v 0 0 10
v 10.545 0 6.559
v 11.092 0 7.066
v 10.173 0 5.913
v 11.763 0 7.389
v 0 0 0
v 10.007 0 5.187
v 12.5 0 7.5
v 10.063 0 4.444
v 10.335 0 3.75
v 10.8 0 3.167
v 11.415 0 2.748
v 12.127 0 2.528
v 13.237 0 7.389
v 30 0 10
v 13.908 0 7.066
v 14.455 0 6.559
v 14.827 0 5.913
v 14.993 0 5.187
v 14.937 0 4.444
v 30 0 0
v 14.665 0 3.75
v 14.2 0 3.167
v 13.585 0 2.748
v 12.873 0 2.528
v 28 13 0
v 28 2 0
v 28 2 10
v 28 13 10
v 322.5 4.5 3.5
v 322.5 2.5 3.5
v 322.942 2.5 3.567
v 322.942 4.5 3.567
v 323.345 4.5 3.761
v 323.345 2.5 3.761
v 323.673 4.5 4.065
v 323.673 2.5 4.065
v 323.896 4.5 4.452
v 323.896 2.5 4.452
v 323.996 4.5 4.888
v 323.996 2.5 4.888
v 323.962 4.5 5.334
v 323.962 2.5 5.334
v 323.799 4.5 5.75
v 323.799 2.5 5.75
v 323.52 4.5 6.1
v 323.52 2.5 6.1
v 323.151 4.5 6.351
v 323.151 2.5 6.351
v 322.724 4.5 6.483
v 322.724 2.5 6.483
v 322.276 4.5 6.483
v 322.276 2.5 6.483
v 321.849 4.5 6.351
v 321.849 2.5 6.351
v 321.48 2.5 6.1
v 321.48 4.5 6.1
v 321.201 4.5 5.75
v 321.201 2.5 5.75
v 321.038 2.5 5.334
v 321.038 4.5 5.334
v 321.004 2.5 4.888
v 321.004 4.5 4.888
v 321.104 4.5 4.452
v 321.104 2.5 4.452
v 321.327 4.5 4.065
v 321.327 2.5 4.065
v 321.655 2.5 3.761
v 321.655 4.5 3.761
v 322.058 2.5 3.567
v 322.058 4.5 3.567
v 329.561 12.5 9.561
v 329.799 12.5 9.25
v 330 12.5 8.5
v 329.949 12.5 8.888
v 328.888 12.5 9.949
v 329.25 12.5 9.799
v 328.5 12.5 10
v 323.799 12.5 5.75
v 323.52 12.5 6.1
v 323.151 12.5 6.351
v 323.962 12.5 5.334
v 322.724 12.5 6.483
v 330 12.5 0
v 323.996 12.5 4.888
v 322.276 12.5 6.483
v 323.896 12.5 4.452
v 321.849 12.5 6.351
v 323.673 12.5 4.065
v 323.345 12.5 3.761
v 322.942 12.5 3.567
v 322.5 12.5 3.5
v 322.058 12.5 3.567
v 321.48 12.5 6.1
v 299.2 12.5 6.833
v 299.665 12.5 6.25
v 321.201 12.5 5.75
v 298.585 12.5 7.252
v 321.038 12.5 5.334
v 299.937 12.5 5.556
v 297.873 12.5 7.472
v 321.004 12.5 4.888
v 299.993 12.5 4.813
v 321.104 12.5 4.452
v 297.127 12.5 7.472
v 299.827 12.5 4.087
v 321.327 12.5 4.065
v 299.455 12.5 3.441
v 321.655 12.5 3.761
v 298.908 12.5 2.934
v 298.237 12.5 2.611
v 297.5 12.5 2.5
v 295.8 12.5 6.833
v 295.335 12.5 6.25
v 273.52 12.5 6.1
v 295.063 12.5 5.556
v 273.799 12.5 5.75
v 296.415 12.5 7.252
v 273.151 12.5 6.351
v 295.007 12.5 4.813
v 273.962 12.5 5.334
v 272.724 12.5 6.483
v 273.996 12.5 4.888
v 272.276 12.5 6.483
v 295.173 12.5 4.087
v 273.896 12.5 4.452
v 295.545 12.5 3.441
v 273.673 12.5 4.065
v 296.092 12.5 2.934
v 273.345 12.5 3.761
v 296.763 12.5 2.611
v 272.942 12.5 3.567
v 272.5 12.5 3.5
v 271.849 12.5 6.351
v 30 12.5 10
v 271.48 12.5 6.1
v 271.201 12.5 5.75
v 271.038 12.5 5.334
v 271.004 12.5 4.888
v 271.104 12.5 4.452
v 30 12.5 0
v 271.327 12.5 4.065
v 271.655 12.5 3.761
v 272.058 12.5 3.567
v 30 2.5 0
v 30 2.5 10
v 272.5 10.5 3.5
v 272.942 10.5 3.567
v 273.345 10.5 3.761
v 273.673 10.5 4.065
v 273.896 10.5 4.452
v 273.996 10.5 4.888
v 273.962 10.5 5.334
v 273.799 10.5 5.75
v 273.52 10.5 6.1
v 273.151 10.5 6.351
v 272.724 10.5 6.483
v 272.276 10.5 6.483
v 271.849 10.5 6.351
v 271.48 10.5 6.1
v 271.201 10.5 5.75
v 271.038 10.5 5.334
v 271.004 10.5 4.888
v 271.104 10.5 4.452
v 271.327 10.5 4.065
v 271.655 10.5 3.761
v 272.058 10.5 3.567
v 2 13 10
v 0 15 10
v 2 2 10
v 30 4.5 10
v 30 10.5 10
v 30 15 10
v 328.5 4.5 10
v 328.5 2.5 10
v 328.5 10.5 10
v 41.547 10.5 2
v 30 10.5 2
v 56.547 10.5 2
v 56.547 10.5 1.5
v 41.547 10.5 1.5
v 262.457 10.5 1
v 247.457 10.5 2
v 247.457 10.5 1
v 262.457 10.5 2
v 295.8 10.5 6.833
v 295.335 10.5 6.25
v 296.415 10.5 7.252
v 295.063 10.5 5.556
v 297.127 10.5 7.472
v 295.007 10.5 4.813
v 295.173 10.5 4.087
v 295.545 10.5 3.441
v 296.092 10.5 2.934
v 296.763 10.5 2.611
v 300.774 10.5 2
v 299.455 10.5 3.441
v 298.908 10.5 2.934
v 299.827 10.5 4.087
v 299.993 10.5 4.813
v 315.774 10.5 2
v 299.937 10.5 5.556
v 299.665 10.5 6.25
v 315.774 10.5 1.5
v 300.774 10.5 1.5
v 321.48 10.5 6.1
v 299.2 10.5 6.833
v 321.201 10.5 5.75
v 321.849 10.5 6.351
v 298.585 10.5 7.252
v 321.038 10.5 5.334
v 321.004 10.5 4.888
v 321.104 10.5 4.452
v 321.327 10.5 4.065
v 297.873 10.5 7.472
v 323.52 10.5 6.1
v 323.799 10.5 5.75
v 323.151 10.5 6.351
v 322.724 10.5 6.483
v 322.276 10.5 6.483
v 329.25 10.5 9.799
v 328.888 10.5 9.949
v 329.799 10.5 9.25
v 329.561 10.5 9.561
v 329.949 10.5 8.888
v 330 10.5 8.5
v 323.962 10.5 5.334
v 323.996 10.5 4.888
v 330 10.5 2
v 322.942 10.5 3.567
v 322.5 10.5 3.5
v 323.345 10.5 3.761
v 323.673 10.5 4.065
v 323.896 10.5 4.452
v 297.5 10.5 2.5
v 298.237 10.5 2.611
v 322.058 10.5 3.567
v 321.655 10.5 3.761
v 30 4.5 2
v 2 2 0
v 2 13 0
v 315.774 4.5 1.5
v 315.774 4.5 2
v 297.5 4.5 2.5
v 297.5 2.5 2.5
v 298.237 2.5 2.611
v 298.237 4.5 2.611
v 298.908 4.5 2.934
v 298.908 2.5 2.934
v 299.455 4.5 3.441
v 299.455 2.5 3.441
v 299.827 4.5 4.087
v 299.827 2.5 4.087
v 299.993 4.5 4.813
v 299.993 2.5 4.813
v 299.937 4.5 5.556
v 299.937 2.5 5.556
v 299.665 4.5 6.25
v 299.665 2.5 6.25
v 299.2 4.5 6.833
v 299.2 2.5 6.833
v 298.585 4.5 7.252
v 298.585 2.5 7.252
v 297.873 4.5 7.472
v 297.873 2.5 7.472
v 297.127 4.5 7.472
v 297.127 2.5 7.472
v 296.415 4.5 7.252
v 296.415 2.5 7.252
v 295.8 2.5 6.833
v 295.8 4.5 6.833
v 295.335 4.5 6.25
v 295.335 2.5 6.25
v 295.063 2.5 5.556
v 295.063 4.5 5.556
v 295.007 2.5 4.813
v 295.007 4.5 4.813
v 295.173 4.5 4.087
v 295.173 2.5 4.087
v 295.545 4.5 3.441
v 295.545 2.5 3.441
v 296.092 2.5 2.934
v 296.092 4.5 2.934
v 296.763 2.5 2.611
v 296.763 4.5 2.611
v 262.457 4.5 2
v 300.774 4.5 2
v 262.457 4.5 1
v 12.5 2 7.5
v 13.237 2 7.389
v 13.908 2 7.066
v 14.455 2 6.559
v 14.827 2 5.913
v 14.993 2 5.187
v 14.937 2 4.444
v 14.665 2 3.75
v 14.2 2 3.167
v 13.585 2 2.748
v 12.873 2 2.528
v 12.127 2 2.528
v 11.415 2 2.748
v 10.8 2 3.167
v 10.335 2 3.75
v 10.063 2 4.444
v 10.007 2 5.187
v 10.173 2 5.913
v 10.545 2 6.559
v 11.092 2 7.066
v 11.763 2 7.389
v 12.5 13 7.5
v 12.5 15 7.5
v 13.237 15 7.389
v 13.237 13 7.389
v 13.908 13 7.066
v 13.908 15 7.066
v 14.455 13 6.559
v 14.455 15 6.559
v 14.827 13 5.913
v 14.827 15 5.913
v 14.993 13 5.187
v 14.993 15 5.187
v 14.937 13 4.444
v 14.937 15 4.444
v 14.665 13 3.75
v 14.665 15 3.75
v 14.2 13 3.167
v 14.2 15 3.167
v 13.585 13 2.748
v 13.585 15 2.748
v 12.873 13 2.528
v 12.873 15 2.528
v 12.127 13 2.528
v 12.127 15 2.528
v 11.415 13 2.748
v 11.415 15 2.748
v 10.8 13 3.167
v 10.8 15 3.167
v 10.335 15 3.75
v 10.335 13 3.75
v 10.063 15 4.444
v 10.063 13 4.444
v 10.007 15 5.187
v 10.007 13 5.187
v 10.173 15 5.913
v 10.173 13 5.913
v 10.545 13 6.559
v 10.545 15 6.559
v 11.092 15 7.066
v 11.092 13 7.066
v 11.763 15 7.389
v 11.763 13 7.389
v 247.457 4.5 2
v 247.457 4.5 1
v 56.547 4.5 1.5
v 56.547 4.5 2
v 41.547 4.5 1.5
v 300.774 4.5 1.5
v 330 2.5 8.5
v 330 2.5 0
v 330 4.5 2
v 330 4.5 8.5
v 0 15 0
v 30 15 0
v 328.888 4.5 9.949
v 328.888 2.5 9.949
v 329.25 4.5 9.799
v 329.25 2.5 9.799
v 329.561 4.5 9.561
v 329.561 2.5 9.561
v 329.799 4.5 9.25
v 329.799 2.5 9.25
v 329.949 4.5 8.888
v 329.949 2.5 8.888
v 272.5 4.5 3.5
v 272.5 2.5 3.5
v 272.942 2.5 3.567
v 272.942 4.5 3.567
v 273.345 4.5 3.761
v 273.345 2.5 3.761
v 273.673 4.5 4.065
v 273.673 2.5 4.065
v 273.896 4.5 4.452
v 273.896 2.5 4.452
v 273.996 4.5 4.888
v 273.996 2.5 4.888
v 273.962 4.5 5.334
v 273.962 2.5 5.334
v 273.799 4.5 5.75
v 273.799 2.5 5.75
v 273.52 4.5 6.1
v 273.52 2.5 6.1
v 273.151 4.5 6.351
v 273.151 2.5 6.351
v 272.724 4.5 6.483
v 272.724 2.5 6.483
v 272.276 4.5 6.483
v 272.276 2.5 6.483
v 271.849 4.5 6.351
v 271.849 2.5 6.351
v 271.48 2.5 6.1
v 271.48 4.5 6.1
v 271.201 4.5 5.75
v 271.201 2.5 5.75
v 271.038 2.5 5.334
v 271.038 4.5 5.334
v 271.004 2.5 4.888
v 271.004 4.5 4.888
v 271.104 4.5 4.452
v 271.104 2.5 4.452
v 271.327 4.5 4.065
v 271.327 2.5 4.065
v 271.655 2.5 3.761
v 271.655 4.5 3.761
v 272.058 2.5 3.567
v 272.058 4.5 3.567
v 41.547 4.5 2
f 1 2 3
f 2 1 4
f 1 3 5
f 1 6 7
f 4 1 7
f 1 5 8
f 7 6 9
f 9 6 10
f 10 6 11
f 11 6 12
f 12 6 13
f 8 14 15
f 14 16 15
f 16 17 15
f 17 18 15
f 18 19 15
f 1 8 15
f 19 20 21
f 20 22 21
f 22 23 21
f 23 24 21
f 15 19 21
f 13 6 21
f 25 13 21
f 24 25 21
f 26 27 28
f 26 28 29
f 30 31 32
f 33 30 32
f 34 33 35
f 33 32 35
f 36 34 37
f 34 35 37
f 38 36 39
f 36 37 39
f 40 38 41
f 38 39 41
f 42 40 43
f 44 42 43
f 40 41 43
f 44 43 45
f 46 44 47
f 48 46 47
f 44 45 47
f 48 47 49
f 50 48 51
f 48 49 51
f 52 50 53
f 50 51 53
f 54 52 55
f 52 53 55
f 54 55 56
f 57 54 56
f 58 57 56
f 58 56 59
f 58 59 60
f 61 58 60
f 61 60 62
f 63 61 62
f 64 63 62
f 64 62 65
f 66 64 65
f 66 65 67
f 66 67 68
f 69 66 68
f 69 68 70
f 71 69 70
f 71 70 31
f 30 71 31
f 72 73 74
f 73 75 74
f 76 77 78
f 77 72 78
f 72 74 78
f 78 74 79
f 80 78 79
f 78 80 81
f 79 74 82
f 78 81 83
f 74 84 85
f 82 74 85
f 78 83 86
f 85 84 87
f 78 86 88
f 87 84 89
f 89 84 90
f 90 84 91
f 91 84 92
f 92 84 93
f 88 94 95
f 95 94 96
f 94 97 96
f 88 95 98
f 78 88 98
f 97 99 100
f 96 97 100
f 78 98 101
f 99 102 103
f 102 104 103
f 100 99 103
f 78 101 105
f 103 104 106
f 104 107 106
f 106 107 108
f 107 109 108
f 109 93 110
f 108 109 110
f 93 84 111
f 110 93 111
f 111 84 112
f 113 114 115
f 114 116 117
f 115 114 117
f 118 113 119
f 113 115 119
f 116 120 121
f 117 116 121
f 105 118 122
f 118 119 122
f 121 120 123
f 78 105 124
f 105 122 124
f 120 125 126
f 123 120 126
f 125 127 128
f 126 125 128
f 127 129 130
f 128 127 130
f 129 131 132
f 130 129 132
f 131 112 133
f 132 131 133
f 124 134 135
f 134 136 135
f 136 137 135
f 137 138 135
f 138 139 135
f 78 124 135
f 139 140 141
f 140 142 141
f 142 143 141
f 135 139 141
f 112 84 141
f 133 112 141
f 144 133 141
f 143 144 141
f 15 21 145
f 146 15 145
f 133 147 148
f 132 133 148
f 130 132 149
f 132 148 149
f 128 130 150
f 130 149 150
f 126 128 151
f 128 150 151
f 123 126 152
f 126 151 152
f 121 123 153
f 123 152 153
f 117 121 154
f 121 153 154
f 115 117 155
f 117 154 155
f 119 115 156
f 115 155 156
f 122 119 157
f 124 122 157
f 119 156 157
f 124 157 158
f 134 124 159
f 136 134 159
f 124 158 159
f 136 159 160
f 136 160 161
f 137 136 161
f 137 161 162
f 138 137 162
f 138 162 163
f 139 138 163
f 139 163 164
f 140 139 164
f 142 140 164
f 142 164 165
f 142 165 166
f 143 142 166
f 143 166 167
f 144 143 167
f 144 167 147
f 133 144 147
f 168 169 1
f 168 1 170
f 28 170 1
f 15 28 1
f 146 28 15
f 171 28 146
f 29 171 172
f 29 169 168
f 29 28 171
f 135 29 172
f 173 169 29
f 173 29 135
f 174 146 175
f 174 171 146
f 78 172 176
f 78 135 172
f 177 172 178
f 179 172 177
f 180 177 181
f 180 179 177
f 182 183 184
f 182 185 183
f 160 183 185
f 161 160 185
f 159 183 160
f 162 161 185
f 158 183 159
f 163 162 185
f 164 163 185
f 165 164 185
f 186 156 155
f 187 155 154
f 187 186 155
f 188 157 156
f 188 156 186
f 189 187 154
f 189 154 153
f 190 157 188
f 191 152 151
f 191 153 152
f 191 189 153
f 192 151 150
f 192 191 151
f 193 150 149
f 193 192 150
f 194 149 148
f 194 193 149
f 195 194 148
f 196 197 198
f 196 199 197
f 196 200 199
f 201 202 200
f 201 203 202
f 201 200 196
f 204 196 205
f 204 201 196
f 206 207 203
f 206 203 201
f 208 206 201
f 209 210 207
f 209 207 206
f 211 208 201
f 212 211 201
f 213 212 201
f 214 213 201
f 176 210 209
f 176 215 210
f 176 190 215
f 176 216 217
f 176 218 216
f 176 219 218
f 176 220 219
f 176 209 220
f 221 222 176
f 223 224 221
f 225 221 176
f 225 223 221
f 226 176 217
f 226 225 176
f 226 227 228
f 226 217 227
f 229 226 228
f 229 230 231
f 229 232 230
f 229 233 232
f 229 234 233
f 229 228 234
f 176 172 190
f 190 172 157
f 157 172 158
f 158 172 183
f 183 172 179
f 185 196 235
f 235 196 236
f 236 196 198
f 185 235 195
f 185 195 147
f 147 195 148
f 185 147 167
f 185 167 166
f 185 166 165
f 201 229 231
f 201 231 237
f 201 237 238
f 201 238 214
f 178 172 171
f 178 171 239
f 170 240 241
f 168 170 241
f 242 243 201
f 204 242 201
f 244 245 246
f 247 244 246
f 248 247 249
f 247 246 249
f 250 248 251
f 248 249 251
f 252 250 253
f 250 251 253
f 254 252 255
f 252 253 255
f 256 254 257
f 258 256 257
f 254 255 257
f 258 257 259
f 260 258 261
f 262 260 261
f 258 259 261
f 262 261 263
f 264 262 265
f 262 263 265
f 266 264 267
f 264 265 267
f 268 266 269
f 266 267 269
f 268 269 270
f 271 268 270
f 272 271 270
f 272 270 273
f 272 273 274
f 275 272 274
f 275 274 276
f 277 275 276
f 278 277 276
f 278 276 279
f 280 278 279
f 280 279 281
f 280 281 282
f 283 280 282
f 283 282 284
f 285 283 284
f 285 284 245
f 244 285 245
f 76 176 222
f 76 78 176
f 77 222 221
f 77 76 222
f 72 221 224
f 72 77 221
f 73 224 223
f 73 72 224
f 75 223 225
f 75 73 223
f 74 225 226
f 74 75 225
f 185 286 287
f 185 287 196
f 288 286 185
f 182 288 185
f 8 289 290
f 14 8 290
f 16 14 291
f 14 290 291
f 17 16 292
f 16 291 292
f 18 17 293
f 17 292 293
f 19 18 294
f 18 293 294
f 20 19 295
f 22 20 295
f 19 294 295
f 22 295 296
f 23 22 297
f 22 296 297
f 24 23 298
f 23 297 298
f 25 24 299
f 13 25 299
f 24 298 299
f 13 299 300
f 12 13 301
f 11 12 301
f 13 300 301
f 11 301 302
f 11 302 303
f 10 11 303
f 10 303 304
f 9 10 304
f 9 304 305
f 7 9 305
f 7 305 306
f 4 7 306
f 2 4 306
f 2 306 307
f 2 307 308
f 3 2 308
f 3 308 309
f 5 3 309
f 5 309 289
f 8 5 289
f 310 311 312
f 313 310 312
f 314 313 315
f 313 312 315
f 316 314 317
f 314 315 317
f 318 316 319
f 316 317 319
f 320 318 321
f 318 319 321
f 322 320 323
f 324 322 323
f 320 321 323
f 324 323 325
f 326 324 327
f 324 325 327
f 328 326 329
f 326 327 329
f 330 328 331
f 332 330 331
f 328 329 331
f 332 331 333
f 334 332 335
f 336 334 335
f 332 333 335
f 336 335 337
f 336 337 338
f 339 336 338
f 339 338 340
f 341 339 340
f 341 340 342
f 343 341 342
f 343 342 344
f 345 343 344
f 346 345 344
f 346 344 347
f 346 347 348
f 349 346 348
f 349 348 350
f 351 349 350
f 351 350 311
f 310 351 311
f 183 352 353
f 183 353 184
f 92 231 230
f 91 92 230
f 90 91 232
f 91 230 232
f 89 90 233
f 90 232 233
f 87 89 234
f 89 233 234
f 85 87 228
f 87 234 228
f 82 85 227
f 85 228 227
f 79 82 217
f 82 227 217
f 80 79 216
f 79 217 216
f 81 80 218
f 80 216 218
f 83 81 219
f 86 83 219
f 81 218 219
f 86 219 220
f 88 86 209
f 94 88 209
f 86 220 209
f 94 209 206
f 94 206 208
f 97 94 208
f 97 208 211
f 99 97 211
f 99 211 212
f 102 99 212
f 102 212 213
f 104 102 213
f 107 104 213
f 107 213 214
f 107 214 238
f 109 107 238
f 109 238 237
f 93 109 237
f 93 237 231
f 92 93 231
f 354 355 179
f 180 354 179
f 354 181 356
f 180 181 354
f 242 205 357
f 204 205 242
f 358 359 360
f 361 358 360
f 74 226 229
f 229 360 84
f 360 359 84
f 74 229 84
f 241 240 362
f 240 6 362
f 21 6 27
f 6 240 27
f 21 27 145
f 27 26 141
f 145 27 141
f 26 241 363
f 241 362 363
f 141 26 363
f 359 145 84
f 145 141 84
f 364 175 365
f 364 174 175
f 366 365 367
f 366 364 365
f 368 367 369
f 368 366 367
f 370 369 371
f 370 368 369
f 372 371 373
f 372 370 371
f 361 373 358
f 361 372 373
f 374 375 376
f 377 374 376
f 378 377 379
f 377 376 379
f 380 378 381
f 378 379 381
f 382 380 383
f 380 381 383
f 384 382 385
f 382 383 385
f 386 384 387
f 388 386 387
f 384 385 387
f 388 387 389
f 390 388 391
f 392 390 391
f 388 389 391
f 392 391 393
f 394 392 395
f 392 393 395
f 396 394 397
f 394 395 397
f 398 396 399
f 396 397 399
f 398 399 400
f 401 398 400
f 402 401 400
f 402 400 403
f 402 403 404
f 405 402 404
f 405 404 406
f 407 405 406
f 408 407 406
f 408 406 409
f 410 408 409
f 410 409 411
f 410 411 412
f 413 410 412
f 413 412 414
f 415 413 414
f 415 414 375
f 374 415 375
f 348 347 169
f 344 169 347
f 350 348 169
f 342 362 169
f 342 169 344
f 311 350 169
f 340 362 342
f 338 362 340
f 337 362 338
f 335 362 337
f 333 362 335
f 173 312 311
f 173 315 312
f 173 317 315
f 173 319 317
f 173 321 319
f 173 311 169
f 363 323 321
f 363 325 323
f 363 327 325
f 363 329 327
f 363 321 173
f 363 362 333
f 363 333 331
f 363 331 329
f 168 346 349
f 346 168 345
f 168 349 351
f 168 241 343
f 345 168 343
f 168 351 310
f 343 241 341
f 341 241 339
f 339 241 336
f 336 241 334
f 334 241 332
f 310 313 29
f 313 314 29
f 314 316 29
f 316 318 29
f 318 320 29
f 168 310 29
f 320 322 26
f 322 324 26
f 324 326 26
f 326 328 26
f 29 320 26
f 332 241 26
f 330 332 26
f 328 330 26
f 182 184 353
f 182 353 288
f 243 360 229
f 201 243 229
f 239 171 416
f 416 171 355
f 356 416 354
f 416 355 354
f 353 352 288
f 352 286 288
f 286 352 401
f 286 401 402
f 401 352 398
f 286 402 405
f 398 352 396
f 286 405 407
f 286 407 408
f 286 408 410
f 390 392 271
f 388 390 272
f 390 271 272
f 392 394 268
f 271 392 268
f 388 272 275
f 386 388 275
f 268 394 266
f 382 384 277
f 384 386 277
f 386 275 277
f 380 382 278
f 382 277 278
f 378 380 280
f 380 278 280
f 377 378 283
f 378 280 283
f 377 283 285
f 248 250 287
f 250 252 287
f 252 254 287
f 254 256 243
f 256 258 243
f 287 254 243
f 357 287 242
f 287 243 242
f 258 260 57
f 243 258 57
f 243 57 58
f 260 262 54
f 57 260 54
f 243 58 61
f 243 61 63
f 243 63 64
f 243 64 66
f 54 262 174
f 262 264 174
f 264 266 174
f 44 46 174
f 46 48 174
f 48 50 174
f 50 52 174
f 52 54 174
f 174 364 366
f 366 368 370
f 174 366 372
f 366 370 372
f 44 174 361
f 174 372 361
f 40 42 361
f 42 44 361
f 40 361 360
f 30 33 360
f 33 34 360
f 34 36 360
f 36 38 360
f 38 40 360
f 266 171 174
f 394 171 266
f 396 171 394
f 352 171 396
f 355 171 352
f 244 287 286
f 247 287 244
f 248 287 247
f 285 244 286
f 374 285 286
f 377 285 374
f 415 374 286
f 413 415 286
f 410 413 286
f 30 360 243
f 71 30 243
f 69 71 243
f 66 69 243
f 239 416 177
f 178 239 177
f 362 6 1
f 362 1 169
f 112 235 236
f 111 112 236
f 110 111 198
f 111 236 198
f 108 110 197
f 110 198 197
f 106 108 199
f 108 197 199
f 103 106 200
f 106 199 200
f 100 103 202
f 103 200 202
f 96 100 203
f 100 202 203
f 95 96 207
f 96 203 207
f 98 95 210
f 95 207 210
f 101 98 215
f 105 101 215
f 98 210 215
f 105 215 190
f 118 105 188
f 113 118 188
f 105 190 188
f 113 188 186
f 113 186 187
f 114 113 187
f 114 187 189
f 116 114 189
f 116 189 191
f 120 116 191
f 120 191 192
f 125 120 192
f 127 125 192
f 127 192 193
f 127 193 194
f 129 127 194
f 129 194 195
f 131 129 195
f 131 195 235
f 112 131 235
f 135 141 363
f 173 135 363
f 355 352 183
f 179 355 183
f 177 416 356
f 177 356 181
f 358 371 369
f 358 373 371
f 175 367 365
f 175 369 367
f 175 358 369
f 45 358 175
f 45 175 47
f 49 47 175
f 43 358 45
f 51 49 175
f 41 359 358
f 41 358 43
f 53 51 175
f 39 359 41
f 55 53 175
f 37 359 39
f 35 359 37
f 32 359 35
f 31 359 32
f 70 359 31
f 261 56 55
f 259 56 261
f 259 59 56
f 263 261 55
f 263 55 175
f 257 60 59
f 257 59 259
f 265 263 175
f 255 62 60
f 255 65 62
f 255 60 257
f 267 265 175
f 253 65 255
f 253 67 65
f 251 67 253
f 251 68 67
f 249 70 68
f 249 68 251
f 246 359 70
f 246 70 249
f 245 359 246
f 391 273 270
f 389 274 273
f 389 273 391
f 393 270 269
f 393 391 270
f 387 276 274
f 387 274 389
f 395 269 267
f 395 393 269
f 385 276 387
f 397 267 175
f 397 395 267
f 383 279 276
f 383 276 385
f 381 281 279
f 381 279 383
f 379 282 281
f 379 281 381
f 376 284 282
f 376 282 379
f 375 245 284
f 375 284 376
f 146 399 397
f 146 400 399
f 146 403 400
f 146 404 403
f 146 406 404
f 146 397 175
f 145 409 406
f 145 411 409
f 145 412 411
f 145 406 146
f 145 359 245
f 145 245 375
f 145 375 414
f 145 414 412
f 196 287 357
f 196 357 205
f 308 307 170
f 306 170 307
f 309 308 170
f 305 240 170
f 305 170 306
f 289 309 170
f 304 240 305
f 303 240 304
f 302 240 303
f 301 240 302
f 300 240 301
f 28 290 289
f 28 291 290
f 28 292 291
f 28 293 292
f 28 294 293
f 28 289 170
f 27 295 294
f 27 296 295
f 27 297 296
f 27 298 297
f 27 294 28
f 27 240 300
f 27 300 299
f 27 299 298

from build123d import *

# Parameters (mm, degrees)
SKETCH1_W           = 30
SKETCH1_H           = 15
SKETCH1_W_2         = 26
SKETCH1_H_2         = 11
BOSS_EXTRUDE1_DEPTH = 10
SKETCH3_R           = 2.5
CUT_EXTRUDE1_DEPTH  = 100
SKETCH5_W           = 300
SKETCH5_H           = 10
BOSS_EXTRUDE2_DEPTH = 10
SKETCH6_W           = 8
SKETCH6_H           = 6
CUT_EXTRUDE2_DEPTH  = 300
SKETCH7_R           = 1.5
SKETCH7_R_2         = 2.5
CUT_EXTRUDE3_DEPTH  = 300
FILLET1_R           = 1.5
SKETCH8_W           = 15
SKETCH8_H           = 6
CUT_EXTRUDE4_DEPTH  = 0.5
SKETCH11_W          = 15
SKETCH11_H          = 6
CUT_EXTRUDE8_DEPTH  = 1
SKETCH9_W           = 15
SKETCH9_H           = 6
CUT_EXTRUDE5_DEPTH  = 0.5


with BuildPart() as part:
    # Sketch1 → Boss-Extrude1 (new body)
    with BuildSketch(Plane.XY):
        with Locations((15, 7.5)):
            Rectangle(SKETCH1_W, SKETCH1_H)
        with Locations((15, 7.5)):
            Rectangle(SKETCH1_W_2, SKETCH1_H_2, mode=Mode.SUBTRACT)
    extrude(amount=BOSS_EXTRUDE1_DEPTH)

    # Sketch3 → Cut-Extrude1 (cut)
    with BuildSketch(Plane(origin=(0, 15, 0), x_dir=(1, 0, 0), z_dir=(0, 1, 0))):
        with Locations(Location((12.5, -5, 0), (0, 0, 270))):
            Circle(SKETCH3_R)
    extrude(amount=-CUT_EXTRUDE1_DEPTH, mode=Mode.SUBTRACT)

    # Sketch5 → Boss-Extrude2 (add)
    with BuildSketch(Plane(origin=(0, 0, 0), x_dir=(-1, 0, 0), z_dir=(0, 0, -1))):
        with Locations((-180, 7.5)):
            Rectangle(SKETCH5_W, SKETCH5_H)
    extrude(amount=-BOSS_EXTRUDE2_DEPTH)

    # Sketch6 → Cut-Extrude2 (cut)
    with BuildSketch(Plane(origin=(330, 0, 0), x_dir=(0, 0, -1), z_dir=(1, 0, 0))):
        with Locations((-6, 7.5)):
            Rectangle(SKETCH6_W, SKETCH6_H)
    extrude(amount=-CUT_EXTRUDE2_DEPTH, mode=Mode.SUBTRACT)

    # Sketch7 → Cut-Extrude3 (cut)
    with BuildSketch(Plane(origin=(0, 2.5, 0), x_dir=(-1, 0, 0), z_dir=(0, -1, 0))):
        with Locations(Location((-272.5, -5, 0), (0, 0, 90))):
            Circle(SKETCH7_R)
        with Locations(Location((-297.5, -5, 0), (0, 0, 90))):
            Circle(SKETCH7_R_2)
        with Locations(Location((-322.5, -5, 0), (0, 0, 90))):
            Circle(SKETCH7_R)
    extrude(amount=-CUT_EXTRUDE3_DEPTH, mode=Mode.SUBTRACT)

    # Fillet1
    fillet1_edges = [part.edges().sort_by_distance(p)[0] for p in [
        (330, 11.5, 10),
        (330, 3.5, 10),
    ]]
    fillet(fillet1_edges, radius=FILLET1_R)

    # Sketch8 → Cut-Extrude4 (cut)
    with BuildSketch(Plane.XY.offset(2)):
        with Locations((49.047215434, 7.5)):
            Rectangle(SKETCH8_W, SKETCH8_H)
    extrude(amount=-CUT_EXTRUDE4_DEPTH, mode=Mode.SUBTRACT)

    # Sketch11 → Cut-Extrude8 (cut)
    with BuildSketch(Plane.XY.offset(2)):
        with Locations((254.956595829, 7.5)):
            Rectangle(SKETCH11_W, SKETCH11_H)
    extrude(amount=-CUT_EXTRUDE8_DEPTH, mode=Mode.SUBTRACT)

    # Sketch9 → Cut-Extrude5 (cut)
    with BuildSketch(Plane.XY.offset(2)):
        with Locations((308.27436269, 7.5)):
            Rectangle(SKETCH9_W, SKETCH9_H)
    extrude(amount=-CUT_EXTRUDE5_DEPTH, mode=Mode.SUBTRACT)


solid = part.part
